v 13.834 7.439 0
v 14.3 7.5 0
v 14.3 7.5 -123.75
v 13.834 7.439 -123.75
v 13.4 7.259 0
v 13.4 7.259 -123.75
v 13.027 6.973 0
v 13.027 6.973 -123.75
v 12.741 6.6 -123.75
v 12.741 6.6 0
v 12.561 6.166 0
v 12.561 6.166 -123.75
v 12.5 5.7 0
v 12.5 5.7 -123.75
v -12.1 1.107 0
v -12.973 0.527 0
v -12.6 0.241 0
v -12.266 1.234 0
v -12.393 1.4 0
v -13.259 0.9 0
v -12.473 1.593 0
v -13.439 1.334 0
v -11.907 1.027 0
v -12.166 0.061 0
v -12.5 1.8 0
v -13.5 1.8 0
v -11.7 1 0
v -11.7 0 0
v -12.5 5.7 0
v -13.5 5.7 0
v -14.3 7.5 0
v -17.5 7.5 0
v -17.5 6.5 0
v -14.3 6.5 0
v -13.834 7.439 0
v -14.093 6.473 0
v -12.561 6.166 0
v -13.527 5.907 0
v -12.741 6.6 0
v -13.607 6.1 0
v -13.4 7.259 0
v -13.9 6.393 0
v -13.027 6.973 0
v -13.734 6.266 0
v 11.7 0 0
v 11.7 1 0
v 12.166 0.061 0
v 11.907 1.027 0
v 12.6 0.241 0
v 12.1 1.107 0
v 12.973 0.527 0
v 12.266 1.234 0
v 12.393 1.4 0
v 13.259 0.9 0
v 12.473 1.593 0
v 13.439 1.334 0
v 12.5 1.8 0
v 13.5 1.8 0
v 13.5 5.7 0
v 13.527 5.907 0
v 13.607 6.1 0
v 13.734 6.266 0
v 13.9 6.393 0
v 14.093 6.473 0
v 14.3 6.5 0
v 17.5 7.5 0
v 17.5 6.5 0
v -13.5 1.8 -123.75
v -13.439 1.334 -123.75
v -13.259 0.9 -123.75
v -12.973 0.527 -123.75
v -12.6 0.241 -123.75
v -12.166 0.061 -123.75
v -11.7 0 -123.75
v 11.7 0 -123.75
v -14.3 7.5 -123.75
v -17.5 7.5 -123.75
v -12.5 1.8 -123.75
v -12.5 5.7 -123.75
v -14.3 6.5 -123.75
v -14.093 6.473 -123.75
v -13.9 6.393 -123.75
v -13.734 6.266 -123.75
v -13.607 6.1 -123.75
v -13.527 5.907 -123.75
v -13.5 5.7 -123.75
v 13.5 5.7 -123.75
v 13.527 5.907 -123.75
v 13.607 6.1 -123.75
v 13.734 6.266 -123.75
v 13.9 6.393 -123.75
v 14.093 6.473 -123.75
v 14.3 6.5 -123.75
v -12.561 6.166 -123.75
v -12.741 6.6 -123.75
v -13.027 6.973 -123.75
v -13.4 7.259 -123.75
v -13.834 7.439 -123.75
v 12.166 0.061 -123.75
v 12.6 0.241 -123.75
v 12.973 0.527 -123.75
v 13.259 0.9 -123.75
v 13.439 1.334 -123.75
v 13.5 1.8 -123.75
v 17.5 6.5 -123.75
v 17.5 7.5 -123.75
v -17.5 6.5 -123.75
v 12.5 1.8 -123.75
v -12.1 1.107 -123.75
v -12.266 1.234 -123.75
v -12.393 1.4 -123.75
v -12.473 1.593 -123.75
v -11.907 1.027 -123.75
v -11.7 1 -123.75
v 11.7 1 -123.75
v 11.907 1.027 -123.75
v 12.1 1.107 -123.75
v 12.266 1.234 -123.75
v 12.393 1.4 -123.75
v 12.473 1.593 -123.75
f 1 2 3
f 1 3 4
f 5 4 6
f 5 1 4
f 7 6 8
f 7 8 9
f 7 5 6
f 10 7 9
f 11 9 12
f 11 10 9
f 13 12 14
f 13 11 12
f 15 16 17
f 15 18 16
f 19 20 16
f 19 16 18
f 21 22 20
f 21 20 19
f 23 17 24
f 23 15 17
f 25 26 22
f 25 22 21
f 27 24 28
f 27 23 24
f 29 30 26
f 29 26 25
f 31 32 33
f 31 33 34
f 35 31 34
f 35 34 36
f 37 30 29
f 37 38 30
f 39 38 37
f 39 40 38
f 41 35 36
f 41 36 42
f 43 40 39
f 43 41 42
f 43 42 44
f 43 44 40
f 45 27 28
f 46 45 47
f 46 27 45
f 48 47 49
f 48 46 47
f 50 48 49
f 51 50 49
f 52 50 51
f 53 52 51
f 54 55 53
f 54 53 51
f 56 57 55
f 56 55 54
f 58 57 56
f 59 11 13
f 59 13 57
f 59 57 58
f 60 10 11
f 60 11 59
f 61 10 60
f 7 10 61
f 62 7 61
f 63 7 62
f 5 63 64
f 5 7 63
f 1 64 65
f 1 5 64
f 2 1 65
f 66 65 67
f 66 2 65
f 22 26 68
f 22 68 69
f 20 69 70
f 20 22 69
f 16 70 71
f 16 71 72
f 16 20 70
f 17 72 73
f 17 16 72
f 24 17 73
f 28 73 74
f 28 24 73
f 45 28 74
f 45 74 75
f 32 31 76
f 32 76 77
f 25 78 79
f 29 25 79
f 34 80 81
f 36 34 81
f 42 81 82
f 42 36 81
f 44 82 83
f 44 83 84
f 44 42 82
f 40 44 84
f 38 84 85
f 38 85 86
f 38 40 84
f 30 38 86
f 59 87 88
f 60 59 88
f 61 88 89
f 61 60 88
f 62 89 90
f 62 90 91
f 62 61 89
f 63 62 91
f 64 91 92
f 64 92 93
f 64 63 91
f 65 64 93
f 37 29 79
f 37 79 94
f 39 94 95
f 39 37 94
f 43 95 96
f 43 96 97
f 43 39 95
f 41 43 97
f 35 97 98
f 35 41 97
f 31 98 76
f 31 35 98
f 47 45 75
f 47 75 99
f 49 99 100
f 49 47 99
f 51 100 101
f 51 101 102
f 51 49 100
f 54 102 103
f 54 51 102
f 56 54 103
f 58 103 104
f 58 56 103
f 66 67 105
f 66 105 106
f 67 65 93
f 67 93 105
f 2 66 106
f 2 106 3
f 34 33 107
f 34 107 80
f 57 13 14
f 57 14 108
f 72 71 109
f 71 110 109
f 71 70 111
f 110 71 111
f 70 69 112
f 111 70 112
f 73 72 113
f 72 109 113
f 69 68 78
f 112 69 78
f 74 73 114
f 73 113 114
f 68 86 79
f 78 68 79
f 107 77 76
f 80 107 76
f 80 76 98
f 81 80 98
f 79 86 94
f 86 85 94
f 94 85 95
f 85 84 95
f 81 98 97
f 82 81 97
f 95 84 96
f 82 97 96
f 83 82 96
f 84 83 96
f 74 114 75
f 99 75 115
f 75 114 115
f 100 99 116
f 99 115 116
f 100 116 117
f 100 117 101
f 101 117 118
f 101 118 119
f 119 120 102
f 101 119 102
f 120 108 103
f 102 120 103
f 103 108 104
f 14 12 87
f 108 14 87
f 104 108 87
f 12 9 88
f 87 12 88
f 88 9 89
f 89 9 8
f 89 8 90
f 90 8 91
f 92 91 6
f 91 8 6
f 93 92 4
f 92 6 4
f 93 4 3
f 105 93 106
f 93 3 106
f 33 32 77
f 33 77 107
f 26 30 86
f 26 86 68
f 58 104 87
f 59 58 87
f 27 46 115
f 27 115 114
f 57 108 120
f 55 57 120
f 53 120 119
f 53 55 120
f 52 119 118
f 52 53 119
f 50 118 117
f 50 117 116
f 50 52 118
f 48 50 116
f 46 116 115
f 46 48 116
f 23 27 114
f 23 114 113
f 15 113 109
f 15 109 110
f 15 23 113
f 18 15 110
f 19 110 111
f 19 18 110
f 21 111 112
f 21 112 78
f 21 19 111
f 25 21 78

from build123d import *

# Parameters (mm, degrees)
DIN_RAIL_NS_35_7_5_PERF_2000MM_1_DEPTH = 123.75


with BuildPart() as part:
    # Sketch12 → Din_rail NS 35 7 5 PERF 2000MM(1) (new body)
    with BuildSketch(Plane(origin=(0, 0, 0), x_dir=(-1, 0, 0), z_dir=(0, 0, -1))):
        with BuildLine():
            Line((11.7, 0), (-11.7, 0))
            ThreePointArc((-11.7, 0), (-12.972792206, 0.527207794), (-13.5, 1.8))
            Line((-13.5, 1.8), (-13.5, 5.7))
            ThreePointArc((-13.5, 5.7), (-13.734314575, 6.265685425), (-14.3, 6.5))
            Line((-14.3, 6.5), (-17.5, 6.5))
            Line((-17.5, 6.5), (-17.5, 7.5))
            Line((-17.5, 7.5), (-14.3, 7.5))
            ThreePointArc((-14.3, 7.5), (-13.027207794, 6.972792206), (-12.5, 5.7))
            Line((-12.5, 5.7), (-12.5, 1.8))
            ThreePointArc((-12.5, 1.8), (-12.265685425, 1.234314575), (-11.7, 1))
            Line((-11.7, 1), (11.7, 1))
            ThreePointArc((11.7, 1), (12.265685425, 1.234314575), (12.5, 1.8))
            Line((12.5, 1.8), (12.5, 5.7))
            ThreePointArc((12.5, 5.7), (13.027207794, 6.972792206), (14.3, 7.5))
            Line((14.3, 7.5), (17.5, 7.5))
            Line((17.5, 7.5), (17.5, 6.5))
            Line((17.5, 6.5), (14.3, 6.5))
            ThreePointArc((14.3, 6.5), (13.734314575, 6.265685425), (13.5, 5.7))
            Line((13.5, 5.7), (13.5, 1.8))
            ThreePointArc((13.5, 1.8), (12.972792206, 0.527207794), (11.7, 0))
        make_face()
    extrude(amount=DIN_RAIL_NS_35_7_5_PERF_2000MM_1_DEPTH)


solid = part.part
